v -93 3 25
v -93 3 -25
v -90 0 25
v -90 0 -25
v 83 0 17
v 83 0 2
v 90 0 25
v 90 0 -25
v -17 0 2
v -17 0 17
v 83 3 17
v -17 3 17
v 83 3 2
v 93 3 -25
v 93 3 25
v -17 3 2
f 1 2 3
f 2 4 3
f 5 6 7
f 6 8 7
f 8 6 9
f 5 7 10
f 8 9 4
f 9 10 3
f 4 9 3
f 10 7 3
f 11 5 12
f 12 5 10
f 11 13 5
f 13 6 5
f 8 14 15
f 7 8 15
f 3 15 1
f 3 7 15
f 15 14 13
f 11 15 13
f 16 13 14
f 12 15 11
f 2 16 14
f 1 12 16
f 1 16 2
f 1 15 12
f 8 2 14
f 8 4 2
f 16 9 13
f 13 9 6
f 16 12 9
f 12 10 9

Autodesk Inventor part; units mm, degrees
ref_plane "YZ Plane" through (0, 0, 0) normal (1, 0, 0) x (0, 1, 0)
ref_plane "XZ Plane" through (0, 0, 0) normal (0, 1, 0) x (-1, 0, 0)
ref_plane "XY Plane" through (0, 0, 0) normal (0, 0, 1) x (1, 0, 0)
sketch "Sketch1" plane through (0, 0, 0) normal (0, 1, 0) x (-1, 0, 0)
  line L0 (93, -25) -> (-93, -25)
  line L1 (-93, -25) -> (-93, 25)
  line L2 (-93, 25) -> (93, 25)
  line L3 (93, 25) -> (93, -25)
  line L4 (93, -25) -> (-93, 25) construction
  line L5 (-93, -25) -> (93, 25) construction
  line L6 (17, 2) -> (-83, 2)
  line L7 (-83, 2) -> (-83, 17)
  line L8 (-83, 17) -> (17, 17)
  line L9 (17, 17) -> (17, 2)
  point P0 (0, 0)
  point P1 (-83, 9.5)
  point P2 (-33, 17)
  dimension "d0" = 186
  dimension "d1" = 50
  dimension "d20" = 10
  dimension "d21" = 100
  dimension "d23" = 23
  dimension "d24" = 8
extrude "Extrusion1" add sketch "Sketch1" along normal blind 3
chamfer "Chamfer3" distance 3 angle 45 1 edges at (-93, 0, 0) measured on face at (-93, 1, -8.3333)
chamfer "Chamfer4" distance 3 angle 45 1 edges at (93, 0, 0) measured on face at (93, 1, 8.3333)
properties part number "Back Wall"
